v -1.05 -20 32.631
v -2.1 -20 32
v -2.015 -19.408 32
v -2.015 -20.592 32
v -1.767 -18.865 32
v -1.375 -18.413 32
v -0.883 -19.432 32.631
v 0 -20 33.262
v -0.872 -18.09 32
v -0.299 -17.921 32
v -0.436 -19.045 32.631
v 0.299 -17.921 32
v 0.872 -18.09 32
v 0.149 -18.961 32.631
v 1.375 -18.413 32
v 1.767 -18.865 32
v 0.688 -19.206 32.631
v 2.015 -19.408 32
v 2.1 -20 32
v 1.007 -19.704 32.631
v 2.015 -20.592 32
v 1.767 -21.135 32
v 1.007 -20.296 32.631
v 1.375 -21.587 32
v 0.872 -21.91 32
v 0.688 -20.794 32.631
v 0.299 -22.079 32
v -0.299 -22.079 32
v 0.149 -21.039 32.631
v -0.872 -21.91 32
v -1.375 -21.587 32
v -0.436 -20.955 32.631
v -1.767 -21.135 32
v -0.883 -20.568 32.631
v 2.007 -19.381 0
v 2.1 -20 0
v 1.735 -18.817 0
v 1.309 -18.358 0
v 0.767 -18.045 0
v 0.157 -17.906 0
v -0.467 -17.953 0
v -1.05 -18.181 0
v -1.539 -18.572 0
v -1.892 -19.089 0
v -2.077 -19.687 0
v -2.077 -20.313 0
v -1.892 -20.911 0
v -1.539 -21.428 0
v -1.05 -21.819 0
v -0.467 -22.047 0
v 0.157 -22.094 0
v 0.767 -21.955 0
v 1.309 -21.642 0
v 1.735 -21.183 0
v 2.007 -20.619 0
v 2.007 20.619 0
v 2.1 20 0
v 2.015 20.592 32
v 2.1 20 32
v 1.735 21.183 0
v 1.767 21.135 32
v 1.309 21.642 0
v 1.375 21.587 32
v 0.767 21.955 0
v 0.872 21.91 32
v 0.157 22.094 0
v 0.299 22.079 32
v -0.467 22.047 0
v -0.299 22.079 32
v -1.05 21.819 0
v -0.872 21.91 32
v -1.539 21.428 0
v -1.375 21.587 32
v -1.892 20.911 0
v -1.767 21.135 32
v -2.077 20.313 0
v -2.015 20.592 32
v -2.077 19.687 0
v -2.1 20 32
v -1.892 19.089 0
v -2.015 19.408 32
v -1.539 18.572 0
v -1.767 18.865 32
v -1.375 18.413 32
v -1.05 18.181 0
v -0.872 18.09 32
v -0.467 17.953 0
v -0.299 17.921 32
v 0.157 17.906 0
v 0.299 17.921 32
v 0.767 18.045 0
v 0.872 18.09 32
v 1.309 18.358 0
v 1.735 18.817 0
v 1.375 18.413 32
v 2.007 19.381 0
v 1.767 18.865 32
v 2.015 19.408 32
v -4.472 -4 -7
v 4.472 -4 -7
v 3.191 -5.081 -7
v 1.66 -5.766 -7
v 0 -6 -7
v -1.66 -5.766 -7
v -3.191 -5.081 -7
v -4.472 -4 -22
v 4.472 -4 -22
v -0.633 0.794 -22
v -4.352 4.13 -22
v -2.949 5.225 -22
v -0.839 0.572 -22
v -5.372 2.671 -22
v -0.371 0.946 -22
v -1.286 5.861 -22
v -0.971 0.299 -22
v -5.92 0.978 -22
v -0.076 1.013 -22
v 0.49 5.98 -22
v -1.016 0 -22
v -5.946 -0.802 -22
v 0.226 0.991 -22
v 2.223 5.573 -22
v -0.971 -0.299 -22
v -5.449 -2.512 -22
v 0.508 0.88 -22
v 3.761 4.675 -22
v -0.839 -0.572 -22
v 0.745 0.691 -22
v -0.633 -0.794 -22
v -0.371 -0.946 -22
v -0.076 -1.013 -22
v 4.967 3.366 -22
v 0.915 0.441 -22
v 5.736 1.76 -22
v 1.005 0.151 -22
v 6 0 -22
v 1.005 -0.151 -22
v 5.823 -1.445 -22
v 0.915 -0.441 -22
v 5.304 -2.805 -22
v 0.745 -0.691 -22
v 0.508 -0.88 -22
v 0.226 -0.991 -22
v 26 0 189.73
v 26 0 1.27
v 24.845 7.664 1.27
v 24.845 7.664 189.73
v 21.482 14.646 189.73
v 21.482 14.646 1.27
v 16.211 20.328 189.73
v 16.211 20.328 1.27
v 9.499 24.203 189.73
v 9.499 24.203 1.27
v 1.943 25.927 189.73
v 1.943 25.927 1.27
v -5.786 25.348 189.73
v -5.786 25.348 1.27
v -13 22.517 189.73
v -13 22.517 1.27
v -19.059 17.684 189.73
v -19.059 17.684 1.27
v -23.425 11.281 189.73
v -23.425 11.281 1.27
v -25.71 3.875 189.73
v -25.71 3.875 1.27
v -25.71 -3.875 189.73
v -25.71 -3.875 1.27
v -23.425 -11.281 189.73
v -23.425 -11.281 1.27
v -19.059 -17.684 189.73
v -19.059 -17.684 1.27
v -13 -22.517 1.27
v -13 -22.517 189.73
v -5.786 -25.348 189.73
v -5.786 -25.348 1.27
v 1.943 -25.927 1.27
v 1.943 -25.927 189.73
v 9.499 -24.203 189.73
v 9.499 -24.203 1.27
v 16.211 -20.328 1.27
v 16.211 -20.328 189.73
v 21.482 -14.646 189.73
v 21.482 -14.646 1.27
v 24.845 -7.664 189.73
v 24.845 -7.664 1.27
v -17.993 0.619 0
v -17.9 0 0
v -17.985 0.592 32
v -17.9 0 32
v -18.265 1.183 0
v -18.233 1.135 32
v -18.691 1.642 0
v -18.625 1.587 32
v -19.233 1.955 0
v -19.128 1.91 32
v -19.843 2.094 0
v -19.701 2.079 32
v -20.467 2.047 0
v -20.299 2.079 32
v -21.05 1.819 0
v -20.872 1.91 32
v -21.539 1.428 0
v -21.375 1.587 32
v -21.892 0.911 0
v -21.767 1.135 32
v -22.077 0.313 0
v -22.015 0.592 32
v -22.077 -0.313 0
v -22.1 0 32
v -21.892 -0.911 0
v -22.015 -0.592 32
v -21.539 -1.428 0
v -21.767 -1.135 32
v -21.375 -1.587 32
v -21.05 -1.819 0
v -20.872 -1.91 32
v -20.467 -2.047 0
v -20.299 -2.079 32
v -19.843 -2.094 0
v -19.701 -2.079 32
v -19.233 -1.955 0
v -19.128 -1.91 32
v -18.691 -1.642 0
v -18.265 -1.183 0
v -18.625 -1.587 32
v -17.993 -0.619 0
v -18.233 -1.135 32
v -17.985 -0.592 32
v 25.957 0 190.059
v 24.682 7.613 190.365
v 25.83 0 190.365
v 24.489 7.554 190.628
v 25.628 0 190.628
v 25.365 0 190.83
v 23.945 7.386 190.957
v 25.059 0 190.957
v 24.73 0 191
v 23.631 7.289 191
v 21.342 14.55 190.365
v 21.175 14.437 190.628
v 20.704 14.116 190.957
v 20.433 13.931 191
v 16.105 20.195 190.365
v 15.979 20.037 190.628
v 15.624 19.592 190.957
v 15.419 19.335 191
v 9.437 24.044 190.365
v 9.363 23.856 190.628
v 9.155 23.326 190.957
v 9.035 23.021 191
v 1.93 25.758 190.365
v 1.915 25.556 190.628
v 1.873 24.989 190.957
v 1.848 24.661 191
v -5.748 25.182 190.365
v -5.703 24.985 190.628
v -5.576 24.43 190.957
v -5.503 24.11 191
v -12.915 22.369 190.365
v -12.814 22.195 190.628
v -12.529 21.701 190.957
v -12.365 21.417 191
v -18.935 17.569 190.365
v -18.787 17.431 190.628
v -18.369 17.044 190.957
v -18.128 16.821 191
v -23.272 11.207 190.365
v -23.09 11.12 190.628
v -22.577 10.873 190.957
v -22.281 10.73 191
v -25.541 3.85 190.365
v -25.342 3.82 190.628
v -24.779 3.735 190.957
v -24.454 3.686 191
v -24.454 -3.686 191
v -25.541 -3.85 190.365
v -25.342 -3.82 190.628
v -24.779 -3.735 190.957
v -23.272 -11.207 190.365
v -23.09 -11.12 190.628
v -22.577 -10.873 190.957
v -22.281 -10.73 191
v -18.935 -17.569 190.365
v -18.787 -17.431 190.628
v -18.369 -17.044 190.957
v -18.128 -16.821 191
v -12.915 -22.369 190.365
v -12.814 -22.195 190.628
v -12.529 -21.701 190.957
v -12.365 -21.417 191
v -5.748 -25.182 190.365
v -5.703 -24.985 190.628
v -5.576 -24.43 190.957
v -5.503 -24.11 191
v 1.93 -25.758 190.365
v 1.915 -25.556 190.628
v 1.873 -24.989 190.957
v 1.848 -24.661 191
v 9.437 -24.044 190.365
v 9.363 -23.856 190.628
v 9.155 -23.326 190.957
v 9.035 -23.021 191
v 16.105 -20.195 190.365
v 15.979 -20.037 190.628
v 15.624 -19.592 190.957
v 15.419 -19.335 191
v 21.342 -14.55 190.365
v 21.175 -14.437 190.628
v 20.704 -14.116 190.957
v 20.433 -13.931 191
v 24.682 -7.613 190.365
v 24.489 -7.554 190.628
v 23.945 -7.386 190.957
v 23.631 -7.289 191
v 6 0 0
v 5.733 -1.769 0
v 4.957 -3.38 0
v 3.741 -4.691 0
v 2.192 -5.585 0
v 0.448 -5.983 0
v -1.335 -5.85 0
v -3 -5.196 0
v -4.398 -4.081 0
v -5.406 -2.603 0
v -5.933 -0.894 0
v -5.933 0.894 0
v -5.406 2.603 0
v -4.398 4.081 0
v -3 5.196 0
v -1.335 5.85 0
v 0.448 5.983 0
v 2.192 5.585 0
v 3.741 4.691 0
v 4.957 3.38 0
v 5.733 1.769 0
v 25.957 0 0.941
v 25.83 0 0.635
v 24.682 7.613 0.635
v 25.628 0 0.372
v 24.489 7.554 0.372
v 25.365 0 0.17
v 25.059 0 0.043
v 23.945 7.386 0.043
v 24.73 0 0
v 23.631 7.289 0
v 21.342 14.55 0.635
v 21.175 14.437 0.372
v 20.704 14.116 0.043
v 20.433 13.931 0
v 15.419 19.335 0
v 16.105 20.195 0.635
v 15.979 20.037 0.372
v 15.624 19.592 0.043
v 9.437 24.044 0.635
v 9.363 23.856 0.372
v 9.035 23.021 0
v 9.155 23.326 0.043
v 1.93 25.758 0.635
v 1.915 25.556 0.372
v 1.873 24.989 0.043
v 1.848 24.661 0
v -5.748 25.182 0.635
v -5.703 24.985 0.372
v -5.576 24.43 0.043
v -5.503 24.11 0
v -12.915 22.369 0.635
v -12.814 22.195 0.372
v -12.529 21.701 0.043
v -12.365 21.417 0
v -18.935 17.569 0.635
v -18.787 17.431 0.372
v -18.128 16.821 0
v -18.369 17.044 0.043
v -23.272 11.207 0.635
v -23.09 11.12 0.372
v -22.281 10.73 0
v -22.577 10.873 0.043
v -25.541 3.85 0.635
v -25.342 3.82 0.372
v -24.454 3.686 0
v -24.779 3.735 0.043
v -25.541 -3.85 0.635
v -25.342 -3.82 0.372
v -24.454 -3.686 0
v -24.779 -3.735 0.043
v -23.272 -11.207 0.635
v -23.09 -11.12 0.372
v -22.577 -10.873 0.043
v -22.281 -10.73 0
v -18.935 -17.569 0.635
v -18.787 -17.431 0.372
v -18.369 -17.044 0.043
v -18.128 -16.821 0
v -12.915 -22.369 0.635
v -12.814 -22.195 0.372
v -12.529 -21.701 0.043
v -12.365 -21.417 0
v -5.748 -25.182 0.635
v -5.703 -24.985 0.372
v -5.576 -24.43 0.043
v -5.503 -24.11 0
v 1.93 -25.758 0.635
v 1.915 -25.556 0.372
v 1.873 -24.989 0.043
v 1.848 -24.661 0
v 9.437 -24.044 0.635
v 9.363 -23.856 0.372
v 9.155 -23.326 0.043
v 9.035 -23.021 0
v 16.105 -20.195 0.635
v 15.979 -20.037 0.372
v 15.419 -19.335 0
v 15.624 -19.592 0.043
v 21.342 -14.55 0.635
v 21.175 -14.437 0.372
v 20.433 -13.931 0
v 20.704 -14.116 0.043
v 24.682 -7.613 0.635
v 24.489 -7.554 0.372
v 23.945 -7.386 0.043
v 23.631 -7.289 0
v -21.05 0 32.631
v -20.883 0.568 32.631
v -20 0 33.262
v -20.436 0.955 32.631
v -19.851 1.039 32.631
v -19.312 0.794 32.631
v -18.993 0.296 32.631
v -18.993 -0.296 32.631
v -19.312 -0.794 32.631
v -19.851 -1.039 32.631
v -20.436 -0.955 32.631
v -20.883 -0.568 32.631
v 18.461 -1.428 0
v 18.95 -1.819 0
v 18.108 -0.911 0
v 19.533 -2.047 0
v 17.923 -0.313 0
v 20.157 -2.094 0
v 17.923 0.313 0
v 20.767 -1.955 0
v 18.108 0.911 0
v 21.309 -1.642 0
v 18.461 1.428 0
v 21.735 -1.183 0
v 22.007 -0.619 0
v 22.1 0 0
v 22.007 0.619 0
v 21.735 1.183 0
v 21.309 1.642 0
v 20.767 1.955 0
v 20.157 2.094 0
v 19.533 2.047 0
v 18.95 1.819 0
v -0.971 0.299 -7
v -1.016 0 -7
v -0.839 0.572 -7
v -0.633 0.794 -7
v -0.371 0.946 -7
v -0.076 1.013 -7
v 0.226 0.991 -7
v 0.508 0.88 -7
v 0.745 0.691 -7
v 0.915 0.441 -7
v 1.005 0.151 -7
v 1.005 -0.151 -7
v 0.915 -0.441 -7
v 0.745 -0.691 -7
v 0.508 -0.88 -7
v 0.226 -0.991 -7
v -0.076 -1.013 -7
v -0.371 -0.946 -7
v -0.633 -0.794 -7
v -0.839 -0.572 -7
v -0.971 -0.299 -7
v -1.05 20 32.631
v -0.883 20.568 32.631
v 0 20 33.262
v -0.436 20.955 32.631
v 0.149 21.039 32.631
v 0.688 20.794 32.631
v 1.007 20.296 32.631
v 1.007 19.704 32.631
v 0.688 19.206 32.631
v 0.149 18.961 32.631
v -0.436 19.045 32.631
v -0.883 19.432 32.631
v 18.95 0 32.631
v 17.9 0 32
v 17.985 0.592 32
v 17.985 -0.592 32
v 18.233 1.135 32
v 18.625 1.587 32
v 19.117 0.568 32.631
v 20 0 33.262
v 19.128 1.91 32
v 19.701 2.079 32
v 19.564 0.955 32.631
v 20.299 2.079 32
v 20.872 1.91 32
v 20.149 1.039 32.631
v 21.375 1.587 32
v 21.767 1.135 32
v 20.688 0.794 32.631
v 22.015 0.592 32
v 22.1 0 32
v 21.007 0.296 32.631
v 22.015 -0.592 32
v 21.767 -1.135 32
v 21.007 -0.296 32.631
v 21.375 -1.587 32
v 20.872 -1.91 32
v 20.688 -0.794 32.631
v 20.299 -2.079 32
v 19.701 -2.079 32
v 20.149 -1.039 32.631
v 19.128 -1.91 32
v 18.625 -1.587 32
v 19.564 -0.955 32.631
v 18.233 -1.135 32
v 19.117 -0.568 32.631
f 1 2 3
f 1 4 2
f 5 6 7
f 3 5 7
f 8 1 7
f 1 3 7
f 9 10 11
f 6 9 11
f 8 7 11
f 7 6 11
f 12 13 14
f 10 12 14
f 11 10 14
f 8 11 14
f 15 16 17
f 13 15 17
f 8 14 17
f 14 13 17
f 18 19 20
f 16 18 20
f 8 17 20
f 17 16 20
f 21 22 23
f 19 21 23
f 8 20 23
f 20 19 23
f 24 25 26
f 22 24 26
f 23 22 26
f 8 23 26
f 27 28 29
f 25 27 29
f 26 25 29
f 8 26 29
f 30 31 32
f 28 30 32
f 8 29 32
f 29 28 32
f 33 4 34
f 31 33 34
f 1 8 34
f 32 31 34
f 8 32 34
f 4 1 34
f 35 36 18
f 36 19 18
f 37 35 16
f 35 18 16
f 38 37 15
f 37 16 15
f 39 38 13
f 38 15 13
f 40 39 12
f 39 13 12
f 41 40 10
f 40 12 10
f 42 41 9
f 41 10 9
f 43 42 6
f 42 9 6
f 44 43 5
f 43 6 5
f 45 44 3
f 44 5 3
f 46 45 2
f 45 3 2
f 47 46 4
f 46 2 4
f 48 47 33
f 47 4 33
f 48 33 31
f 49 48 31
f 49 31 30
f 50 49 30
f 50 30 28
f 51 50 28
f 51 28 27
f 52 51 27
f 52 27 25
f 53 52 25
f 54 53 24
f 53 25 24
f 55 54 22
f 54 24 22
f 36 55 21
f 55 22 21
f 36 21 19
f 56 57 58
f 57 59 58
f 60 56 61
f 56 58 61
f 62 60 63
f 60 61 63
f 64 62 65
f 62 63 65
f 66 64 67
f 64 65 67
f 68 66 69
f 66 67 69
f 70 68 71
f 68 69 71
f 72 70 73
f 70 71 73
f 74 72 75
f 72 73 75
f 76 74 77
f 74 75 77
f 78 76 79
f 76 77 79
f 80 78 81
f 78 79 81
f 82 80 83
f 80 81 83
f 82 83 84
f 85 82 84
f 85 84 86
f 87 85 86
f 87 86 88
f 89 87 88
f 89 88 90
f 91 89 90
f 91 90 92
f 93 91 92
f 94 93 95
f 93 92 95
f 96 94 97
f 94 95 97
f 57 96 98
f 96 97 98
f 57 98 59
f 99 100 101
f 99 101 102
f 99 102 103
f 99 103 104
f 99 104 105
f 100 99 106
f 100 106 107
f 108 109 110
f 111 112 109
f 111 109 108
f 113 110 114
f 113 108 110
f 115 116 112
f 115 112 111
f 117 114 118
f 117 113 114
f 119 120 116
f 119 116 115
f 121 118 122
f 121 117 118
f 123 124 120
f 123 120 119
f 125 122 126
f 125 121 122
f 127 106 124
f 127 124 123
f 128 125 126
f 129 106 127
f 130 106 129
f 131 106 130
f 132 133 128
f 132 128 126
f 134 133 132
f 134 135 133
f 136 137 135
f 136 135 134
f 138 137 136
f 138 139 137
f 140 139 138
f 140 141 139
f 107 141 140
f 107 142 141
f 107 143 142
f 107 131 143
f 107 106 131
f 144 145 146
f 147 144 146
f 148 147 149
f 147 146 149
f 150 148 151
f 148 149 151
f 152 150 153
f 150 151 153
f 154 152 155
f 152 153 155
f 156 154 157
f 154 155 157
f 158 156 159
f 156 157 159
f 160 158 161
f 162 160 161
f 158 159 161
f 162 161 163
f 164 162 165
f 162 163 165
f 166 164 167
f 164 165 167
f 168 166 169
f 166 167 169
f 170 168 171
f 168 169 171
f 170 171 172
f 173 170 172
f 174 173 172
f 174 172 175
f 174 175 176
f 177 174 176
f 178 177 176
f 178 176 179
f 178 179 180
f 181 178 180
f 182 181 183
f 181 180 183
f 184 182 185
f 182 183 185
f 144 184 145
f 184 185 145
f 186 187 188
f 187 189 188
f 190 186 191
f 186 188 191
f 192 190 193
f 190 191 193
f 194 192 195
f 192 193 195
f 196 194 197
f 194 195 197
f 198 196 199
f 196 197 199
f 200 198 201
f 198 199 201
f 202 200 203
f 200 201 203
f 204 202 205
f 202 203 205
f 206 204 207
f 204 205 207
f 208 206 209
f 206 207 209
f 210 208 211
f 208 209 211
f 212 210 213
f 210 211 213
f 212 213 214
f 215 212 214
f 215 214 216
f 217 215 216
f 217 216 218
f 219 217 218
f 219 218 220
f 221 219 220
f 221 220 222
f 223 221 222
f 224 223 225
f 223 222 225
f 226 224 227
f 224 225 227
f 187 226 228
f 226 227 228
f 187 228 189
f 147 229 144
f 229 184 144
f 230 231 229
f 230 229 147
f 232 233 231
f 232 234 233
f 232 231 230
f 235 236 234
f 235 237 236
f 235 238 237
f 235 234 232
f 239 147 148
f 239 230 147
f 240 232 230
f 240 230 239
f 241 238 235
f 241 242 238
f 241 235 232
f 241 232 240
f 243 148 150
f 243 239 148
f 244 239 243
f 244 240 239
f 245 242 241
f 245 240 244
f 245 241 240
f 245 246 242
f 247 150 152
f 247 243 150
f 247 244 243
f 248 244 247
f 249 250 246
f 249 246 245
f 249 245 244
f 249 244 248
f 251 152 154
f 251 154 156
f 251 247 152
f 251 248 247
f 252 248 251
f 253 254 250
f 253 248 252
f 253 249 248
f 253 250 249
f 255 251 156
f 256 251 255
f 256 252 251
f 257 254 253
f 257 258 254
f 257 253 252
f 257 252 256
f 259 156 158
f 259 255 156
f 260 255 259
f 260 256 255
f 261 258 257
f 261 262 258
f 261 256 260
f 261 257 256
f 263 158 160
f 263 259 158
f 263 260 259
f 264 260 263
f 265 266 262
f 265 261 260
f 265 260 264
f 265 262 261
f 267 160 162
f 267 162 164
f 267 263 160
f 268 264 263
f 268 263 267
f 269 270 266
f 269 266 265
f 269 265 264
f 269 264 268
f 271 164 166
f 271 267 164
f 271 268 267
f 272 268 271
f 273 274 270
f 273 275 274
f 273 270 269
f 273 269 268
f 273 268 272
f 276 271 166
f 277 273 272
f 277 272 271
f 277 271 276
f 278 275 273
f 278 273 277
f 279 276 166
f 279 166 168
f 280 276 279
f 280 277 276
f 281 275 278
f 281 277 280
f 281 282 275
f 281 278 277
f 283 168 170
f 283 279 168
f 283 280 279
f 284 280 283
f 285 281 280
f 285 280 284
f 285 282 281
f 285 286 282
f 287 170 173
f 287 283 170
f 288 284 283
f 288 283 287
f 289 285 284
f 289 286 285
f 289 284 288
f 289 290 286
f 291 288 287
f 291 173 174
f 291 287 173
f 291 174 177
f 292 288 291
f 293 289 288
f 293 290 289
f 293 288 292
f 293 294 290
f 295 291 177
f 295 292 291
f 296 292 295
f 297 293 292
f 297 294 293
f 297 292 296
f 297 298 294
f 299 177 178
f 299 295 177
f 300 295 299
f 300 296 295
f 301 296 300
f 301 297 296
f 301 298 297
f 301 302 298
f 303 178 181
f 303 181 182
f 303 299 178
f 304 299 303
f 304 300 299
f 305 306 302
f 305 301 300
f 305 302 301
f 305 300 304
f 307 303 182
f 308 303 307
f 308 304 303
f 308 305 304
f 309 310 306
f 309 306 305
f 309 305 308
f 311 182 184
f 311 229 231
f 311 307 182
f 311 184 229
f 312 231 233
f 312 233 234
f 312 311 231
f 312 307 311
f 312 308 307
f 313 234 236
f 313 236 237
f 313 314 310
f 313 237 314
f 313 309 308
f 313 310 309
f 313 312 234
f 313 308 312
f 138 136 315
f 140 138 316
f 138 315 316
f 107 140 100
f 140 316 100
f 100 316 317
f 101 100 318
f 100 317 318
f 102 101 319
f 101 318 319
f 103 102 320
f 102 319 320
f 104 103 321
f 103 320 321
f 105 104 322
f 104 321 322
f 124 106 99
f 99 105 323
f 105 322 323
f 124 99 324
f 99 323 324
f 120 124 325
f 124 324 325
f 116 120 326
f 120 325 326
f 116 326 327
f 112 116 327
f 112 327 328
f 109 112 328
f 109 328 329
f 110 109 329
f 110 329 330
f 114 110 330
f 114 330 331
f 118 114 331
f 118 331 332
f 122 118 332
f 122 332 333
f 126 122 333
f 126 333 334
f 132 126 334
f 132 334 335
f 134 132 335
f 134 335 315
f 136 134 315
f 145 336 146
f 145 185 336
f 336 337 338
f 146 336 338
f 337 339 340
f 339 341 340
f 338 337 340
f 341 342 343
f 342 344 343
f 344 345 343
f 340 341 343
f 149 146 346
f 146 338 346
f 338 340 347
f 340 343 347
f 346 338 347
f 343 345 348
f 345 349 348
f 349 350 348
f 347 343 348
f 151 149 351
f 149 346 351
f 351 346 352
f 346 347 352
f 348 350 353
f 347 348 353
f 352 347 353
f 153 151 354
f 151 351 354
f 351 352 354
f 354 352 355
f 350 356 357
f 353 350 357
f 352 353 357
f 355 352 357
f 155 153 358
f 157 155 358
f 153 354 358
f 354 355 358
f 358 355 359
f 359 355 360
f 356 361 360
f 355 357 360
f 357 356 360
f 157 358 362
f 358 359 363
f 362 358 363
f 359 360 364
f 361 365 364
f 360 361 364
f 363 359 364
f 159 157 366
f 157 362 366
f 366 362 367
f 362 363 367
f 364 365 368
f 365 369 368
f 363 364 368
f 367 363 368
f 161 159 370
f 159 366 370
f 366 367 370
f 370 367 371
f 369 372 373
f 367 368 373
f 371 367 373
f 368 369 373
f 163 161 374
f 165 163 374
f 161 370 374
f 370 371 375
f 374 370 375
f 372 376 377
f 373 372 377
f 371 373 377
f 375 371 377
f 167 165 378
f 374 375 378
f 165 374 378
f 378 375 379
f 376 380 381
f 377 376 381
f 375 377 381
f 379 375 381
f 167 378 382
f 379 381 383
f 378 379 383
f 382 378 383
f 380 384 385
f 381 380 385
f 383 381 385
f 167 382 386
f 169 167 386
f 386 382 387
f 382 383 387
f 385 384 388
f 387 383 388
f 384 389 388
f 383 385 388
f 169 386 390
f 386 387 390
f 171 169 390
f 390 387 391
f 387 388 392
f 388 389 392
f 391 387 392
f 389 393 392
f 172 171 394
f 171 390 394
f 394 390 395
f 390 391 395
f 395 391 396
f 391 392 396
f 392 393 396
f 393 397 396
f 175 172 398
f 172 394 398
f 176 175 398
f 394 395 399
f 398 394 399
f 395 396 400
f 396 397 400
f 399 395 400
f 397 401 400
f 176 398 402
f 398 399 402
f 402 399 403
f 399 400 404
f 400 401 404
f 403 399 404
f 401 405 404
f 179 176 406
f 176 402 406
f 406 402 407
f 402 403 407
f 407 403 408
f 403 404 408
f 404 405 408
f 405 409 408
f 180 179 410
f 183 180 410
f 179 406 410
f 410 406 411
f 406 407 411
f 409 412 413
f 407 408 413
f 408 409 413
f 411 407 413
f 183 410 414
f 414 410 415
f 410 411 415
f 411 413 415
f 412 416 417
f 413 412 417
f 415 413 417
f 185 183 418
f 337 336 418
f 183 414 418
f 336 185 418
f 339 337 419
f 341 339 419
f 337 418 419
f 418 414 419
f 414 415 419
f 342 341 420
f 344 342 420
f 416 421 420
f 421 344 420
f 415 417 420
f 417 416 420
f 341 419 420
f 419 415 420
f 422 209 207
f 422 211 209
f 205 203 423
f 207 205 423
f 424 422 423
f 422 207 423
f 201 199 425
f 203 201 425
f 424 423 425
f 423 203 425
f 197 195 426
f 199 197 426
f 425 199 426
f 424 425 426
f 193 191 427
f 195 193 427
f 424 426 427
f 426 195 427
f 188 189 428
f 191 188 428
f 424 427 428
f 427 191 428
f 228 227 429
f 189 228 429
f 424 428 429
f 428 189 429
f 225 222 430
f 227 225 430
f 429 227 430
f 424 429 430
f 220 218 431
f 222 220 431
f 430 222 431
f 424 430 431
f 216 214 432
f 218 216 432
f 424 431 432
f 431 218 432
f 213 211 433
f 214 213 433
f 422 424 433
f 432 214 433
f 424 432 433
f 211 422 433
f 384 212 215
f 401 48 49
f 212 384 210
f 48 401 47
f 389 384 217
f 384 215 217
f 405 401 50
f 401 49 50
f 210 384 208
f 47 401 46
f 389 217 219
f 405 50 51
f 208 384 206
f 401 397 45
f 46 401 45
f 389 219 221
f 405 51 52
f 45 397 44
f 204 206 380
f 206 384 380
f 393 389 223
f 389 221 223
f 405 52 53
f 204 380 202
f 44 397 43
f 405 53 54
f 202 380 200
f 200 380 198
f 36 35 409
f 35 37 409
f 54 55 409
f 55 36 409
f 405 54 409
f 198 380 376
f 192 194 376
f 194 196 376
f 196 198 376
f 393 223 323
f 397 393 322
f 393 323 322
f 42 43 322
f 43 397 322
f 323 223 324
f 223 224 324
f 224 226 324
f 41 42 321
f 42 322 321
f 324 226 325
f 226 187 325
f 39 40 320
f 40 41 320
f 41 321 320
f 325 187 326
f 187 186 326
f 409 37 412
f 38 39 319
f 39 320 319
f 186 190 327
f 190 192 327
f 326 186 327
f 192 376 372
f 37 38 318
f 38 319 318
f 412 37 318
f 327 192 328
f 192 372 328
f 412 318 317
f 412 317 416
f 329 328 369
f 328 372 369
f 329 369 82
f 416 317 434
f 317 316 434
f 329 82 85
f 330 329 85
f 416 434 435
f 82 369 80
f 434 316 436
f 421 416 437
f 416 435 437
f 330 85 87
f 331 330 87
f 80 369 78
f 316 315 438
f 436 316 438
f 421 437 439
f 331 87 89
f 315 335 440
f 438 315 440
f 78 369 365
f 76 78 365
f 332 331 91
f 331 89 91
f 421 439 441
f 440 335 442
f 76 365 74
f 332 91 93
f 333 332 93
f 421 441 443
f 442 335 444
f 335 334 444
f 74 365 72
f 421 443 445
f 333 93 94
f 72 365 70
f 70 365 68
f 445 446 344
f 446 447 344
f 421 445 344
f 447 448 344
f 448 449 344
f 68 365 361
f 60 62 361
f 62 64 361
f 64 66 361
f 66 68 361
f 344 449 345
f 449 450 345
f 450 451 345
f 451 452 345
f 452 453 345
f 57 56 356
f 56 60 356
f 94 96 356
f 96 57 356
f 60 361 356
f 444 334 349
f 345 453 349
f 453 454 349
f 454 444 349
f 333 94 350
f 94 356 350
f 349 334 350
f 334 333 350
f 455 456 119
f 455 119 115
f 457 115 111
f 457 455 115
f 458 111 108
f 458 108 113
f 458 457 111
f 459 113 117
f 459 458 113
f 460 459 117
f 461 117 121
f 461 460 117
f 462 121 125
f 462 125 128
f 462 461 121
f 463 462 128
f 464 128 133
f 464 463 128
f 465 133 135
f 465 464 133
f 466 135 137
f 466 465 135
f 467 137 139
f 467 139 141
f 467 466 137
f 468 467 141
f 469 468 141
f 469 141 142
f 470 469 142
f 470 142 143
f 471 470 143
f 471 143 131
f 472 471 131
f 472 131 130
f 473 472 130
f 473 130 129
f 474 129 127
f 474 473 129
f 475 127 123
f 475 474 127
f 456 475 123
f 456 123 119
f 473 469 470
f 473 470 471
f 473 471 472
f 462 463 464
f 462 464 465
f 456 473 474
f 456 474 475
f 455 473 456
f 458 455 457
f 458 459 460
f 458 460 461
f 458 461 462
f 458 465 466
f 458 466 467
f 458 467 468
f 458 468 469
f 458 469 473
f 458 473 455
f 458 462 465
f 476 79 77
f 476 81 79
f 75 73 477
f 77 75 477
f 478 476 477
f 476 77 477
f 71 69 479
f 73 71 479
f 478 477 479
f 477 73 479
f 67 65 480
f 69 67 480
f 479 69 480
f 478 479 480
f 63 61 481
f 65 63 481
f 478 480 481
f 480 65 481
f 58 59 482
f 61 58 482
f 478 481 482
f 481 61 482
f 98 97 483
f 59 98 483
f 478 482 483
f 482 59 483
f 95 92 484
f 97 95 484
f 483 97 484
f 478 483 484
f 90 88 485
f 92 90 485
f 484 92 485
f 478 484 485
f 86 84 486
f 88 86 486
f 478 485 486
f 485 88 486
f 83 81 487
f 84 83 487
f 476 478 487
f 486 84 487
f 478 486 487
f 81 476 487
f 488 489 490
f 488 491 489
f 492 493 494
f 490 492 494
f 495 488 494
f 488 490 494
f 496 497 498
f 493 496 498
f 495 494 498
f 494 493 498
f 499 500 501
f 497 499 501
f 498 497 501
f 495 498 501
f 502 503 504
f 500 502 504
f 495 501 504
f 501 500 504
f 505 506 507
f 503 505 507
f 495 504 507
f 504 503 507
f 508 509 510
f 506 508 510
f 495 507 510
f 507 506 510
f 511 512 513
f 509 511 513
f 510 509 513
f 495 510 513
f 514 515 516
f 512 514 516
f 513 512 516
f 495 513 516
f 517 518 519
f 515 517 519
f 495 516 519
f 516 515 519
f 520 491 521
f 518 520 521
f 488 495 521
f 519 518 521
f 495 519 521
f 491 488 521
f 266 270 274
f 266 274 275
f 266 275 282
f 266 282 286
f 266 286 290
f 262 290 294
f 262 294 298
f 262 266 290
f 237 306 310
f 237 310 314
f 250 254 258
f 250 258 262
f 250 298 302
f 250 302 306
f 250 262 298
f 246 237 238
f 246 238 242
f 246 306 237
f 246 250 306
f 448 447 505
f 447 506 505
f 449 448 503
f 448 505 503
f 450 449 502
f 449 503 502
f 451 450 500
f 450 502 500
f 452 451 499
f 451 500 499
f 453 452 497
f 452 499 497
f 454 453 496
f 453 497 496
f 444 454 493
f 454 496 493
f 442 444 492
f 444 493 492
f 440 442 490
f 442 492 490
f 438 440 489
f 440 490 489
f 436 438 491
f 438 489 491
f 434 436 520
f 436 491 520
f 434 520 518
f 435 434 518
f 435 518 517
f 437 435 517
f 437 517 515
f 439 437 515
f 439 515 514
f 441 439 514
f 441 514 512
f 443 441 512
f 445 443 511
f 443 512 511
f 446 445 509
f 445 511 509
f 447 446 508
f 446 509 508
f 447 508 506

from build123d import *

# Parameters (mm, degrees)
SKETCH1_R                 = 26
BODY_DEPTH                = 191
SKETCH2_R                 = 6
AXLE_DEPTH                = 22
FLAT_START                = -15
SKETCH3_R                 = 1.016
FLAT_DEPTH                = 15
M5X0_8_TAPPED_HOLE1_D     = 4.2
M5X0_8_TAPPED_HOLE1_DEPTH = 32.0000122
M5X0_8_TAPPED_HOLE1_TIP   = 1.2618073
FILLET1_R                 = 1.27


with BuildPart() as part:
    # Sketch1 → body (new body)
    with BuildSketch(Plane.XY):
        Circle(SKETCH1_R)
    extrude(amount=BODY_DEPTH)

    # Sketch2 → axle (add)
    with BuildSketch(Plane(origin=(0, 0, 0), x_dir=(-1, 0, 0), z_dir=(0, 0, -1))):
        with Locations(Location((0, 0, 0), (0, 0, 180))):
            Circle(SKETCH2_R)
    extrude(amount=AXLE_DEPTH)

    # Sketch3 → flat (cut)
    with BuildSketch(Plane(origin=(0, 0, -22), x_dir=(-1, 0, 0), z_dir=(0, 0, -1)).offset(FLAT_START)):
        with BuildLine():
            Line((4.472135955, -4), (-4.472135955, -4))
            ThreePointArc((-4.472135955, -4), (0, -6), (4.472135955, -4))
        make_face()
        Circle(SKETCH3_R)
    extrude(amount=FLAT_DEPTH, mode=Mode.SUBTRACT)

    # M5x0.8 Tapped Hole1
    with Locations(Plane(origin=(0, 0, 0), x_dir=(-1, 0, 0), z_dir=(0, 0, -1))):
        with Locations((0, -20), (-20, 0), (0, 20), (20, 0)):
            Hole(M5X0_8_TAPPED_HOLE1_D / 2, depth=M5X0_8_TAPPED_HOLE1_DEPTH)
            with Locations((0, 0, -(M5X0_8_TAPPED_HOLE1_DEPTH + M5X0_8_TAPPED_HOLE1_TIP / 2))):  # 118° drill point
                Cone(0, M5X0_8_TAPPED_HOLE1_D / 2, M5X0_8_TAPPED_HOLE1_TIP, mode=Mode.SUBTRACT)

    # Fillet1
    fillet1_edges = [part.edges().sort_by_distance(p)[0] for p in [
        (-26, 0, 0),
        (-26, 0, 191),
    ]]
    fillet(fillet1_edges, radius=FILLET1_R)


solid = part.part
